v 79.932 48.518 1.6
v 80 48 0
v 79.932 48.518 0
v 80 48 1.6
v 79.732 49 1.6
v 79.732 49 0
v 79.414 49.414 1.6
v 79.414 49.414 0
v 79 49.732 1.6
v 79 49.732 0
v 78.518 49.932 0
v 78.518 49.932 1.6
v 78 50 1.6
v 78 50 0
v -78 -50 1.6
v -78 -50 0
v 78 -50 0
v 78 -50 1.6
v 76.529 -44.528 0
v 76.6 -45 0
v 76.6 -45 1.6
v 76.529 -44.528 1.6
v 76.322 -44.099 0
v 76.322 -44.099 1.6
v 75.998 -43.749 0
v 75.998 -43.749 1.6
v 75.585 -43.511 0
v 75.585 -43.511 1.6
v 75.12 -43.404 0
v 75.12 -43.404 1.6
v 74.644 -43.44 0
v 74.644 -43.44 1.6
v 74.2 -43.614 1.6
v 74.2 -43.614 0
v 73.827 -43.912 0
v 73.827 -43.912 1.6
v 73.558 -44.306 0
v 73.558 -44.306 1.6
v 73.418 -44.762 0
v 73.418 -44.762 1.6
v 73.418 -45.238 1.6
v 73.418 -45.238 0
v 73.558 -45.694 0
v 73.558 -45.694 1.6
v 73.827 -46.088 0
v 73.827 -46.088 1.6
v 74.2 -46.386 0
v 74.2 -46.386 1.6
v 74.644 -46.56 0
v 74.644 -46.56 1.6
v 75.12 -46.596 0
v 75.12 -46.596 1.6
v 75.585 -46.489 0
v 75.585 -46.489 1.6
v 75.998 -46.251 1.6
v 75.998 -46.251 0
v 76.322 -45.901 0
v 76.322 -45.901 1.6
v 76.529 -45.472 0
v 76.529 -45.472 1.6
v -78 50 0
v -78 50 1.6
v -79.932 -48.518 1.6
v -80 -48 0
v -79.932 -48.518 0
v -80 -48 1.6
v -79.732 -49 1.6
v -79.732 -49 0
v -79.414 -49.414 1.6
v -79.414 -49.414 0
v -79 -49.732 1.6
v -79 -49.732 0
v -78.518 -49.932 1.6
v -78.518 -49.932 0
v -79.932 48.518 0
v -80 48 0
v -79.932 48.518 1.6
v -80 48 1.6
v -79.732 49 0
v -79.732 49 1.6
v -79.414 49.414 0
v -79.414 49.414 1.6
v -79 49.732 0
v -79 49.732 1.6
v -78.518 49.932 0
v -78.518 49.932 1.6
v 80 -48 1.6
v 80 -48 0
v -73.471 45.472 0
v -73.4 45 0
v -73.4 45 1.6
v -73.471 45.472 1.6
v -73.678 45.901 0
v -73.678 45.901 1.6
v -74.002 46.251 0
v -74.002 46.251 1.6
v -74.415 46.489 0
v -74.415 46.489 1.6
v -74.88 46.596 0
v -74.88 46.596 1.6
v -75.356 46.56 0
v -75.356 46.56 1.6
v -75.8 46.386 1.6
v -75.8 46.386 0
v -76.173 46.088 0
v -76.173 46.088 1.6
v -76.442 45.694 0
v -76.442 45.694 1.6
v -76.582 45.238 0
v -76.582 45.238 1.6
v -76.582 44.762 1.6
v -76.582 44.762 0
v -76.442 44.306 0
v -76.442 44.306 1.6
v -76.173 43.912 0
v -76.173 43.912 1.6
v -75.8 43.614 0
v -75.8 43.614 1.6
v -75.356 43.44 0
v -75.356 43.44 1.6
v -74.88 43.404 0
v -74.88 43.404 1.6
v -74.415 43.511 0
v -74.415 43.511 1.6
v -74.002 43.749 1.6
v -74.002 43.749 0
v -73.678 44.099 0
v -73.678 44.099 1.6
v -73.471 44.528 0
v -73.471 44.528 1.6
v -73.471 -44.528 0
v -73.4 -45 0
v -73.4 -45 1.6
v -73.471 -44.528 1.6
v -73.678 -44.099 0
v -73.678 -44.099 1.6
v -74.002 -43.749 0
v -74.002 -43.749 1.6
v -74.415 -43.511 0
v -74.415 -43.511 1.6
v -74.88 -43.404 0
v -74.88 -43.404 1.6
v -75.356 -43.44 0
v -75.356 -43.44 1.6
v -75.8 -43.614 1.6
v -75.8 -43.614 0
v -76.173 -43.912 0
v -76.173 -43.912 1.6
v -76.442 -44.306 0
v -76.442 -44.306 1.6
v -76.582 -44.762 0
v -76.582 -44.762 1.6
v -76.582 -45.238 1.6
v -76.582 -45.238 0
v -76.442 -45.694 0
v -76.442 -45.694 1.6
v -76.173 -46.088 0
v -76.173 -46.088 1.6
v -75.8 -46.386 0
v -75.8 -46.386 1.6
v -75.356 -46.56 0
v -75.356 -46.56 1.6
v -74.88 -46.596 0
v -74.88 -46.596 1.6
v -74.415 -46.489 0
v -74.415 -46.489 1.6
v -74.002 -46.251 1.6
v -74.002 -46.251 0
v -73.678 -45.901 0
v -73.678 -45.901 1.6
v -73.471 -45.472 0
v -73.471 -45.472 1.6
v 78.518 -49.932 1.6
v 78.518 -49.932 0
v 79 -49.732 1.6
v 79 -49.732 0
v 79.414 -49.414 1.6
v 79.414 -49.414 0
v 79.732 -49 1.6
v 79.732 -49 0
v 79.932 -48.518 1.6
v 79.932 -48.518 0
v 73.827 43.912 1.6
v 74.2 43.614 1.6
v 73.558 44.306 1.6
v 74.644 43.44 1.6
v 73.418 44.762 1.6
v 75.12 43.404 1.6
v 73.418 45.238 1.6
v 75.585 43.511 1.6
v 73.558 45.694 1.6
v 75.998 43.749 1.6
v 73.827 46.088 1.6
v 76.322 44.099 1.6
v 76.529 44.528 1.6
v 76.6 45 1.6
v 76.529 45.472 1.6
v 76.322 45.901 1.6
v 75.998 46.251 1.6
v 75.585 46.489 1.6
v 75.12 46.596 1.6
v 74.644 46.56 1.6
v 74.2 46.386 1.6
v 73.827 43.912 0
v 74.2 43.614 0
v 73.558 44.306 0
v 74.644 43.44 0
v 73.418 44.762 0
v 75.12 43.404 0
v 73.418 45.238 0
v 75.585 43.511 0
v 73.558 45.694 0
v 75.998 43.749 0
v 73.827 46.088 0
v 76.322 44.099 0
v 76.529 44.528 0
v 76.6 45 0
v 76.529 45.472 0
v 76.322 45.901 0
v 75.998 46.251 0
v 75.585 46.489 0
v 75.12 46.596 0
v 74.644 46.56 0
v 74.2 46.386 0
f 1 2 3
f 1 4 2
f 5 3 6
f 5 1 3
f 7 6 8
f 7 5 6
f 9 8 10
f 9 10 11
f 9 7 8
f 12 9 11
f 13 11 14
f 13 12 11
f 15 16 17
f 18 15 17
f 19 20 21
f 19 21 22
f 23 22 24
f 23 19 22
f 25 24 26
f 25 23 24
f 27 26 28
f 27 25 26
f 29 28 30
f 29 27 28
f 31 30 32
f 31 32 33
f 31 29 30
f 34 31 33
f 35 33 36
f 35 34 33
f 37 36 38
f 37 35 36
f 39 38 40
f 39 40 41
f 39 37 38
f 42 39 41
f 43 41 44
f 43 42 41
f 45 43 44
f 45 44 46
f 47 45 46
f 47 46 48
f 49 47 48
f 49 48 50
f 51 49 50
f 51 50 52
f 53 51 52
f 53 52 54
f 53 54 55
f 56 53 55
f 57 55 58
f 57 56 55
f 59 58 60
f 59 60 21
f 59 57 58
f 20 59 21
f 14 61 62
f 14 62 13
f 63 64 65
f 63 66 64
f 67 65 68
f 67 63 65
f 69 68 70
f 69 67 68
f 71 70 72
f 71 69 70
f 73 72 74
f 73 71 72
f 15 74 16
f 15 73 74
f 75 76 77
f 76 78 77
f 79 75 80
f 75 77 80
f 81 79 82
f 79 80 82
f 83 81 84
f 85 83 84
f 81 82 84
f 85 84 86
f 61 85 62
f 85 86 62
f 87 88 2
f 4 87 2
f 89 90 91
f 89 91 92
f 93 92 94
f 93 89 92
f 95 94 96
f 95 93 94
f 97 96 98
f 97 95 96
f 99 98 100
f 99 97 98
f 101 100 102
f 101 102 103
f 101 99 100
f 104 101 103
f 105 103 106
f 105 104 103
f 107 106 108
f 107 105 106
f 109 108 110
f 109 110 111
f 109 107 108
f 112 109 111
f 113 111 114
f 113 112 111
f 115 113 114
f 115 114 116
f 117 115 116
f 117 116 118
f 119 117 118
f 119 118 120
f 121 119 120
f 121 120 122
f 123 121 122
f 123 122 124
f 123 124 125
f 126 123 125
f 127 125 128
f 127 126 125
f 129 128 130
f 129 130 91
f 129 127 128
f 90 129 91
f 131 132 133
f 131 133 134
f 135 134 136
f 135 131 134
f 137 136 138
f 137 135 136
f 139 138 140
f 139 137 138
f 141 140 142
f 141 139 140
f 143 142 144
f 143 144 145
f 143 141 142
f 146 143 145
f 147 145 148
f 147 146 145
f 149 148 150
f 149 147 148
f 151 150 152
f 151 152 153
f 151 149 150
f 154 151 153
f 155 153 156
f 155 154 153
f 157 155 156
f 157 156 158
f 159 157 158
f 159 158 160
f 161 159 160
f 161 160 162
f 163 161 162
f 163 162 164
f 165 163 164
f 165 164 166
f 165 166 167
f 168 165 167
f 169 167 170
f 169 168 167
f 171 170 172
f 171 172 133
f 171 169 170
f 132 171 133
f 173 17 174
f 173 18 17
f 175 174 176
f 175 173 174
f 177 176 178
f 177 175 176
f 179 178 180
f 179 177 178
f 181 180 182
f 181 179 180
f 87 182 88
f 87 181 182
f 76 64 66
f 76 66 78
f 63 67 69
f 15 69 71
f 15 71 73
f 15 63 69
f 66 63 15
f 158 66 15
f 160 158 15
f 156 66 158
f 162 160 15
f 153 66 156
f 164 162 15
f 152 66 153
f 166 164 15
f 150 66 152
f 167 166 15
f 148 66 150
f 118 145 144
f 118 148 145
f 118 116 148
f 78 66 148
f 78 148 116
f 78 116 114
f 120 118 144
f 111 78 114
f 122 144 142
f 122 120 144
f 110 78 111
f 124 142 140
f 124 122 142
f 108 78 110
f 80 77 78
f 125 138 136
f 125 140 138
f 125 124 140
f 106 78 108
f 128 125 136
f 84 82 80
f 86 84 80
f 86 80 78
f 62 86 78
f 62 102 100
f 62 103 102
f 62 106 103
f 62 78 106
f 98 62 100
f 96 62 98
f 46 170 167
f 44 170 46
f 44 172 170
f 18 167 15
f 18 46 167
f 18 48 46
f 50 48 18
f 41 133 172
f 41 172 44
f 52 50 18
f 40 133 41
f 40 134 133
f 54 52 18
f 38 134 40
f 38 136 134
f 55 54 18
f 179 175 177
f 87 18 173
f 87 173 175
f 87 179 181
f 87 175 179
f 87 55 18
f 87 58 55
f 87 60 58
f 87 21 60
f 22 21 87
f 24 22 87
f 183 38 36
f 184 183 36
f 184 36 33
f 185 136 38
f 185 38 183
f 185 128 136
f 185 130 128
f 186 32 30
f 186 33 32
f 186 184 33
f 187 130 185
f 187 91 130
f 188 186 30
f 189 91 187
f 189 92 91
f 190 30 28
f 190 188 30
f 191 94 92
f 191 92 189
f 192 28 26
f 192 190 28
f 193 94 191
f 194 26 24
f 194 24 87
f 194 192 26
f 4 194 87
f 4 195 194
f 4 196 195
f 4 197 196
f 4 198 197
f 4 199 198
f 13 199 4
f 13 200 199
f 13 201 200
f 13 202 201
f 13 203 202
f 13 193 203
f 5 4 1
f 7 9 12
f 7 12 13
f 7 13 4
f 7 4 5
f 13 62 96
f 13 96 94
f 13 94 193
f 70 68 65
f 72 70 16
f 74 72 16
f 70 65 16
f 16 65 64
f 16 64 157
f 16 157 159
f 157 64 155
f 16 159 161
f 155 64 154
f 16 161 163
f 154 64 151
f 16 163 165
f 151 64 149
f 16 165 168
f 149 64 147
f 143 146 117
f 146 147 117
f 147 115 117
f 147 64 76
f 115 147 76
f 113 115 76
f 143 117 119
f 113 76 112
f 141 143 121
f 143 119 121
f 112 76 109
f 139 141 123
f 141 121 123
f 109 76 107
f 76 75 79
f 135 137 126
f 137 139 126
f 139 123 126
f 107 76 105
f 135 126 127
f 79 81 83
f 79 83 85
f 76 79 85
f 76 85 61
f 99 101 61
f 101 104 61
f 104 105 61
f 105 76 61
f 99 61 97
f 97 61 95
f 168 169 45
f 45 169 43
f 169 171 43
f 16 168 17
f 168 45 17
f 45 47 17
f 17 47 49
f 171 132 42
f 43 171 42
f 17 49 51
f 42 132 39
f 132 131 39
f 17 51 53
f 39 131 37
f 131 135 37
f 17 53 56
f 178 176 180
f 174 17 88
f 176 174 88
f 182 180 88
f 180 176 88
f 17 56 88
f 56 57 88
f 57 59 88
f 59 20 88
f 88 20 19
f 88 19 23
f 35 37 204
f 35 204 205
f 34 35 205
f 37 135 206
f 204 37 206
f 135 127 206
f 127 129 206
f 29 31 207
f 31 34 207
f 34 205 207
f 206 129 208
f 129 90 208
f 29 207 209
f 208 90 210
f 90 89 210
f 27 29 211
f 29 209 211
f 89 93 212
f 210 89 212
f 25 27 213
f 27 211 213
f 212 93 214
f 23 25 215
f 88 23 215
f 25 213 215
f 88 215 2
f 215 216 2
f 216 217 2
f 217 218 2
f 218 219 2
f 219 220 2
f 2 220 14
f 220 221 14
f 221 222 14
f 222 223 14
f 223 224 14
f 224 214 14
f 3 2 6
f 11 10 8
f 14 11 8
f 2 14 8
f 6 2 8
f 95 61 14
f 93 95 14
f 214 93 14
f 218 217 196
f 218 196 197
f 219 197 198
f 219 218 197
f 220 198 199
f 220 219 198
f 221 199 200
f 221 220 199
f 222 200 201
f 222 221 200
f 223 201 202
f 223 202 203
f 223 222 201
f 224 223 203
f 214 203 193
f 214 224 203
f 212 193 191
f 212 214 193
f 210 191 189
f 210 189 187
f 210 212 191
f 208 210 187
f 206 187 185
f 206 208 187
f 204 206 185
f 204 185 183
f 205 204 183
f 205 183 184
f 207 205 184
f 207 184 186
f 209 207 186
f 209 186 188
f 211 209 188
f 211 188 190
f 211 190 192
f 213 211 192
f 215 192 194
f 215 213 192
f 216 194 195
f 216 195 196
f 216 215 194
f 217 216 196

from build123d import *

# Parameters (mm, degrees)
SKETCH_1_W                 = 160
SKETCH_1_H                 = 100
EXTRUDE_1_DEPTH            = 1.6
FILLET_1_R                 = 2
HOLE_WIZARD_M3_1_OUTLINE_R = 1.6
HOLE_WIZARD_M3_1_DEPTH     = 1.6


# Read off the part's stored shape, not the designer's step: M3 すきま穴1
with BuildPart() as part:
    # ｽｹｯﾁ1 → ﾎﾞｽ - 押し出し1 (new body)
    with BuildSketch(Plane.XY):
        Rectangle(SKETCH_1_W, SKETCH_1_H)
    extrude(amount=EXTRUDE_1_DEPTH)

    # ﾌｨﾚｯﾄ1
    fillet_1_edges = [part.edges().sort_by_distance(p)[0] for p in [
        (-80, 50, 0.8),
        (80, 50, 0.8),
        (80, -50, 0.8),
        (-80, -50, 0.8),
    ]]
    fillet(fillet_1_edges, radius=FILLET_1_R)

    # M3 すきま穴1 outline → M3 すきま穴1 (cut)
    with BuildSketch(Plane.XY):
        with Locations((75, -45)):
            Circle(HOLE_WIZARD_M3_1_OUTLINE_R)
        with Locations((-75, 45)):
            Circle(HOLE_WIZARD_M3_1_OUTLINE_R)
        with Locations((-75, -45)):
            Circle(HOLE_WIZARD_M3_1_OUTLINE_R)
        with Locations((75, 45)):
            Circle(HOLE_WIZARD_M3_1_OUTLINE_R)
    extrude(amount=HOLE_WIZARD_M3_1_DEPTH, mode=Mode.SUBTRACT)


solid = part.part
